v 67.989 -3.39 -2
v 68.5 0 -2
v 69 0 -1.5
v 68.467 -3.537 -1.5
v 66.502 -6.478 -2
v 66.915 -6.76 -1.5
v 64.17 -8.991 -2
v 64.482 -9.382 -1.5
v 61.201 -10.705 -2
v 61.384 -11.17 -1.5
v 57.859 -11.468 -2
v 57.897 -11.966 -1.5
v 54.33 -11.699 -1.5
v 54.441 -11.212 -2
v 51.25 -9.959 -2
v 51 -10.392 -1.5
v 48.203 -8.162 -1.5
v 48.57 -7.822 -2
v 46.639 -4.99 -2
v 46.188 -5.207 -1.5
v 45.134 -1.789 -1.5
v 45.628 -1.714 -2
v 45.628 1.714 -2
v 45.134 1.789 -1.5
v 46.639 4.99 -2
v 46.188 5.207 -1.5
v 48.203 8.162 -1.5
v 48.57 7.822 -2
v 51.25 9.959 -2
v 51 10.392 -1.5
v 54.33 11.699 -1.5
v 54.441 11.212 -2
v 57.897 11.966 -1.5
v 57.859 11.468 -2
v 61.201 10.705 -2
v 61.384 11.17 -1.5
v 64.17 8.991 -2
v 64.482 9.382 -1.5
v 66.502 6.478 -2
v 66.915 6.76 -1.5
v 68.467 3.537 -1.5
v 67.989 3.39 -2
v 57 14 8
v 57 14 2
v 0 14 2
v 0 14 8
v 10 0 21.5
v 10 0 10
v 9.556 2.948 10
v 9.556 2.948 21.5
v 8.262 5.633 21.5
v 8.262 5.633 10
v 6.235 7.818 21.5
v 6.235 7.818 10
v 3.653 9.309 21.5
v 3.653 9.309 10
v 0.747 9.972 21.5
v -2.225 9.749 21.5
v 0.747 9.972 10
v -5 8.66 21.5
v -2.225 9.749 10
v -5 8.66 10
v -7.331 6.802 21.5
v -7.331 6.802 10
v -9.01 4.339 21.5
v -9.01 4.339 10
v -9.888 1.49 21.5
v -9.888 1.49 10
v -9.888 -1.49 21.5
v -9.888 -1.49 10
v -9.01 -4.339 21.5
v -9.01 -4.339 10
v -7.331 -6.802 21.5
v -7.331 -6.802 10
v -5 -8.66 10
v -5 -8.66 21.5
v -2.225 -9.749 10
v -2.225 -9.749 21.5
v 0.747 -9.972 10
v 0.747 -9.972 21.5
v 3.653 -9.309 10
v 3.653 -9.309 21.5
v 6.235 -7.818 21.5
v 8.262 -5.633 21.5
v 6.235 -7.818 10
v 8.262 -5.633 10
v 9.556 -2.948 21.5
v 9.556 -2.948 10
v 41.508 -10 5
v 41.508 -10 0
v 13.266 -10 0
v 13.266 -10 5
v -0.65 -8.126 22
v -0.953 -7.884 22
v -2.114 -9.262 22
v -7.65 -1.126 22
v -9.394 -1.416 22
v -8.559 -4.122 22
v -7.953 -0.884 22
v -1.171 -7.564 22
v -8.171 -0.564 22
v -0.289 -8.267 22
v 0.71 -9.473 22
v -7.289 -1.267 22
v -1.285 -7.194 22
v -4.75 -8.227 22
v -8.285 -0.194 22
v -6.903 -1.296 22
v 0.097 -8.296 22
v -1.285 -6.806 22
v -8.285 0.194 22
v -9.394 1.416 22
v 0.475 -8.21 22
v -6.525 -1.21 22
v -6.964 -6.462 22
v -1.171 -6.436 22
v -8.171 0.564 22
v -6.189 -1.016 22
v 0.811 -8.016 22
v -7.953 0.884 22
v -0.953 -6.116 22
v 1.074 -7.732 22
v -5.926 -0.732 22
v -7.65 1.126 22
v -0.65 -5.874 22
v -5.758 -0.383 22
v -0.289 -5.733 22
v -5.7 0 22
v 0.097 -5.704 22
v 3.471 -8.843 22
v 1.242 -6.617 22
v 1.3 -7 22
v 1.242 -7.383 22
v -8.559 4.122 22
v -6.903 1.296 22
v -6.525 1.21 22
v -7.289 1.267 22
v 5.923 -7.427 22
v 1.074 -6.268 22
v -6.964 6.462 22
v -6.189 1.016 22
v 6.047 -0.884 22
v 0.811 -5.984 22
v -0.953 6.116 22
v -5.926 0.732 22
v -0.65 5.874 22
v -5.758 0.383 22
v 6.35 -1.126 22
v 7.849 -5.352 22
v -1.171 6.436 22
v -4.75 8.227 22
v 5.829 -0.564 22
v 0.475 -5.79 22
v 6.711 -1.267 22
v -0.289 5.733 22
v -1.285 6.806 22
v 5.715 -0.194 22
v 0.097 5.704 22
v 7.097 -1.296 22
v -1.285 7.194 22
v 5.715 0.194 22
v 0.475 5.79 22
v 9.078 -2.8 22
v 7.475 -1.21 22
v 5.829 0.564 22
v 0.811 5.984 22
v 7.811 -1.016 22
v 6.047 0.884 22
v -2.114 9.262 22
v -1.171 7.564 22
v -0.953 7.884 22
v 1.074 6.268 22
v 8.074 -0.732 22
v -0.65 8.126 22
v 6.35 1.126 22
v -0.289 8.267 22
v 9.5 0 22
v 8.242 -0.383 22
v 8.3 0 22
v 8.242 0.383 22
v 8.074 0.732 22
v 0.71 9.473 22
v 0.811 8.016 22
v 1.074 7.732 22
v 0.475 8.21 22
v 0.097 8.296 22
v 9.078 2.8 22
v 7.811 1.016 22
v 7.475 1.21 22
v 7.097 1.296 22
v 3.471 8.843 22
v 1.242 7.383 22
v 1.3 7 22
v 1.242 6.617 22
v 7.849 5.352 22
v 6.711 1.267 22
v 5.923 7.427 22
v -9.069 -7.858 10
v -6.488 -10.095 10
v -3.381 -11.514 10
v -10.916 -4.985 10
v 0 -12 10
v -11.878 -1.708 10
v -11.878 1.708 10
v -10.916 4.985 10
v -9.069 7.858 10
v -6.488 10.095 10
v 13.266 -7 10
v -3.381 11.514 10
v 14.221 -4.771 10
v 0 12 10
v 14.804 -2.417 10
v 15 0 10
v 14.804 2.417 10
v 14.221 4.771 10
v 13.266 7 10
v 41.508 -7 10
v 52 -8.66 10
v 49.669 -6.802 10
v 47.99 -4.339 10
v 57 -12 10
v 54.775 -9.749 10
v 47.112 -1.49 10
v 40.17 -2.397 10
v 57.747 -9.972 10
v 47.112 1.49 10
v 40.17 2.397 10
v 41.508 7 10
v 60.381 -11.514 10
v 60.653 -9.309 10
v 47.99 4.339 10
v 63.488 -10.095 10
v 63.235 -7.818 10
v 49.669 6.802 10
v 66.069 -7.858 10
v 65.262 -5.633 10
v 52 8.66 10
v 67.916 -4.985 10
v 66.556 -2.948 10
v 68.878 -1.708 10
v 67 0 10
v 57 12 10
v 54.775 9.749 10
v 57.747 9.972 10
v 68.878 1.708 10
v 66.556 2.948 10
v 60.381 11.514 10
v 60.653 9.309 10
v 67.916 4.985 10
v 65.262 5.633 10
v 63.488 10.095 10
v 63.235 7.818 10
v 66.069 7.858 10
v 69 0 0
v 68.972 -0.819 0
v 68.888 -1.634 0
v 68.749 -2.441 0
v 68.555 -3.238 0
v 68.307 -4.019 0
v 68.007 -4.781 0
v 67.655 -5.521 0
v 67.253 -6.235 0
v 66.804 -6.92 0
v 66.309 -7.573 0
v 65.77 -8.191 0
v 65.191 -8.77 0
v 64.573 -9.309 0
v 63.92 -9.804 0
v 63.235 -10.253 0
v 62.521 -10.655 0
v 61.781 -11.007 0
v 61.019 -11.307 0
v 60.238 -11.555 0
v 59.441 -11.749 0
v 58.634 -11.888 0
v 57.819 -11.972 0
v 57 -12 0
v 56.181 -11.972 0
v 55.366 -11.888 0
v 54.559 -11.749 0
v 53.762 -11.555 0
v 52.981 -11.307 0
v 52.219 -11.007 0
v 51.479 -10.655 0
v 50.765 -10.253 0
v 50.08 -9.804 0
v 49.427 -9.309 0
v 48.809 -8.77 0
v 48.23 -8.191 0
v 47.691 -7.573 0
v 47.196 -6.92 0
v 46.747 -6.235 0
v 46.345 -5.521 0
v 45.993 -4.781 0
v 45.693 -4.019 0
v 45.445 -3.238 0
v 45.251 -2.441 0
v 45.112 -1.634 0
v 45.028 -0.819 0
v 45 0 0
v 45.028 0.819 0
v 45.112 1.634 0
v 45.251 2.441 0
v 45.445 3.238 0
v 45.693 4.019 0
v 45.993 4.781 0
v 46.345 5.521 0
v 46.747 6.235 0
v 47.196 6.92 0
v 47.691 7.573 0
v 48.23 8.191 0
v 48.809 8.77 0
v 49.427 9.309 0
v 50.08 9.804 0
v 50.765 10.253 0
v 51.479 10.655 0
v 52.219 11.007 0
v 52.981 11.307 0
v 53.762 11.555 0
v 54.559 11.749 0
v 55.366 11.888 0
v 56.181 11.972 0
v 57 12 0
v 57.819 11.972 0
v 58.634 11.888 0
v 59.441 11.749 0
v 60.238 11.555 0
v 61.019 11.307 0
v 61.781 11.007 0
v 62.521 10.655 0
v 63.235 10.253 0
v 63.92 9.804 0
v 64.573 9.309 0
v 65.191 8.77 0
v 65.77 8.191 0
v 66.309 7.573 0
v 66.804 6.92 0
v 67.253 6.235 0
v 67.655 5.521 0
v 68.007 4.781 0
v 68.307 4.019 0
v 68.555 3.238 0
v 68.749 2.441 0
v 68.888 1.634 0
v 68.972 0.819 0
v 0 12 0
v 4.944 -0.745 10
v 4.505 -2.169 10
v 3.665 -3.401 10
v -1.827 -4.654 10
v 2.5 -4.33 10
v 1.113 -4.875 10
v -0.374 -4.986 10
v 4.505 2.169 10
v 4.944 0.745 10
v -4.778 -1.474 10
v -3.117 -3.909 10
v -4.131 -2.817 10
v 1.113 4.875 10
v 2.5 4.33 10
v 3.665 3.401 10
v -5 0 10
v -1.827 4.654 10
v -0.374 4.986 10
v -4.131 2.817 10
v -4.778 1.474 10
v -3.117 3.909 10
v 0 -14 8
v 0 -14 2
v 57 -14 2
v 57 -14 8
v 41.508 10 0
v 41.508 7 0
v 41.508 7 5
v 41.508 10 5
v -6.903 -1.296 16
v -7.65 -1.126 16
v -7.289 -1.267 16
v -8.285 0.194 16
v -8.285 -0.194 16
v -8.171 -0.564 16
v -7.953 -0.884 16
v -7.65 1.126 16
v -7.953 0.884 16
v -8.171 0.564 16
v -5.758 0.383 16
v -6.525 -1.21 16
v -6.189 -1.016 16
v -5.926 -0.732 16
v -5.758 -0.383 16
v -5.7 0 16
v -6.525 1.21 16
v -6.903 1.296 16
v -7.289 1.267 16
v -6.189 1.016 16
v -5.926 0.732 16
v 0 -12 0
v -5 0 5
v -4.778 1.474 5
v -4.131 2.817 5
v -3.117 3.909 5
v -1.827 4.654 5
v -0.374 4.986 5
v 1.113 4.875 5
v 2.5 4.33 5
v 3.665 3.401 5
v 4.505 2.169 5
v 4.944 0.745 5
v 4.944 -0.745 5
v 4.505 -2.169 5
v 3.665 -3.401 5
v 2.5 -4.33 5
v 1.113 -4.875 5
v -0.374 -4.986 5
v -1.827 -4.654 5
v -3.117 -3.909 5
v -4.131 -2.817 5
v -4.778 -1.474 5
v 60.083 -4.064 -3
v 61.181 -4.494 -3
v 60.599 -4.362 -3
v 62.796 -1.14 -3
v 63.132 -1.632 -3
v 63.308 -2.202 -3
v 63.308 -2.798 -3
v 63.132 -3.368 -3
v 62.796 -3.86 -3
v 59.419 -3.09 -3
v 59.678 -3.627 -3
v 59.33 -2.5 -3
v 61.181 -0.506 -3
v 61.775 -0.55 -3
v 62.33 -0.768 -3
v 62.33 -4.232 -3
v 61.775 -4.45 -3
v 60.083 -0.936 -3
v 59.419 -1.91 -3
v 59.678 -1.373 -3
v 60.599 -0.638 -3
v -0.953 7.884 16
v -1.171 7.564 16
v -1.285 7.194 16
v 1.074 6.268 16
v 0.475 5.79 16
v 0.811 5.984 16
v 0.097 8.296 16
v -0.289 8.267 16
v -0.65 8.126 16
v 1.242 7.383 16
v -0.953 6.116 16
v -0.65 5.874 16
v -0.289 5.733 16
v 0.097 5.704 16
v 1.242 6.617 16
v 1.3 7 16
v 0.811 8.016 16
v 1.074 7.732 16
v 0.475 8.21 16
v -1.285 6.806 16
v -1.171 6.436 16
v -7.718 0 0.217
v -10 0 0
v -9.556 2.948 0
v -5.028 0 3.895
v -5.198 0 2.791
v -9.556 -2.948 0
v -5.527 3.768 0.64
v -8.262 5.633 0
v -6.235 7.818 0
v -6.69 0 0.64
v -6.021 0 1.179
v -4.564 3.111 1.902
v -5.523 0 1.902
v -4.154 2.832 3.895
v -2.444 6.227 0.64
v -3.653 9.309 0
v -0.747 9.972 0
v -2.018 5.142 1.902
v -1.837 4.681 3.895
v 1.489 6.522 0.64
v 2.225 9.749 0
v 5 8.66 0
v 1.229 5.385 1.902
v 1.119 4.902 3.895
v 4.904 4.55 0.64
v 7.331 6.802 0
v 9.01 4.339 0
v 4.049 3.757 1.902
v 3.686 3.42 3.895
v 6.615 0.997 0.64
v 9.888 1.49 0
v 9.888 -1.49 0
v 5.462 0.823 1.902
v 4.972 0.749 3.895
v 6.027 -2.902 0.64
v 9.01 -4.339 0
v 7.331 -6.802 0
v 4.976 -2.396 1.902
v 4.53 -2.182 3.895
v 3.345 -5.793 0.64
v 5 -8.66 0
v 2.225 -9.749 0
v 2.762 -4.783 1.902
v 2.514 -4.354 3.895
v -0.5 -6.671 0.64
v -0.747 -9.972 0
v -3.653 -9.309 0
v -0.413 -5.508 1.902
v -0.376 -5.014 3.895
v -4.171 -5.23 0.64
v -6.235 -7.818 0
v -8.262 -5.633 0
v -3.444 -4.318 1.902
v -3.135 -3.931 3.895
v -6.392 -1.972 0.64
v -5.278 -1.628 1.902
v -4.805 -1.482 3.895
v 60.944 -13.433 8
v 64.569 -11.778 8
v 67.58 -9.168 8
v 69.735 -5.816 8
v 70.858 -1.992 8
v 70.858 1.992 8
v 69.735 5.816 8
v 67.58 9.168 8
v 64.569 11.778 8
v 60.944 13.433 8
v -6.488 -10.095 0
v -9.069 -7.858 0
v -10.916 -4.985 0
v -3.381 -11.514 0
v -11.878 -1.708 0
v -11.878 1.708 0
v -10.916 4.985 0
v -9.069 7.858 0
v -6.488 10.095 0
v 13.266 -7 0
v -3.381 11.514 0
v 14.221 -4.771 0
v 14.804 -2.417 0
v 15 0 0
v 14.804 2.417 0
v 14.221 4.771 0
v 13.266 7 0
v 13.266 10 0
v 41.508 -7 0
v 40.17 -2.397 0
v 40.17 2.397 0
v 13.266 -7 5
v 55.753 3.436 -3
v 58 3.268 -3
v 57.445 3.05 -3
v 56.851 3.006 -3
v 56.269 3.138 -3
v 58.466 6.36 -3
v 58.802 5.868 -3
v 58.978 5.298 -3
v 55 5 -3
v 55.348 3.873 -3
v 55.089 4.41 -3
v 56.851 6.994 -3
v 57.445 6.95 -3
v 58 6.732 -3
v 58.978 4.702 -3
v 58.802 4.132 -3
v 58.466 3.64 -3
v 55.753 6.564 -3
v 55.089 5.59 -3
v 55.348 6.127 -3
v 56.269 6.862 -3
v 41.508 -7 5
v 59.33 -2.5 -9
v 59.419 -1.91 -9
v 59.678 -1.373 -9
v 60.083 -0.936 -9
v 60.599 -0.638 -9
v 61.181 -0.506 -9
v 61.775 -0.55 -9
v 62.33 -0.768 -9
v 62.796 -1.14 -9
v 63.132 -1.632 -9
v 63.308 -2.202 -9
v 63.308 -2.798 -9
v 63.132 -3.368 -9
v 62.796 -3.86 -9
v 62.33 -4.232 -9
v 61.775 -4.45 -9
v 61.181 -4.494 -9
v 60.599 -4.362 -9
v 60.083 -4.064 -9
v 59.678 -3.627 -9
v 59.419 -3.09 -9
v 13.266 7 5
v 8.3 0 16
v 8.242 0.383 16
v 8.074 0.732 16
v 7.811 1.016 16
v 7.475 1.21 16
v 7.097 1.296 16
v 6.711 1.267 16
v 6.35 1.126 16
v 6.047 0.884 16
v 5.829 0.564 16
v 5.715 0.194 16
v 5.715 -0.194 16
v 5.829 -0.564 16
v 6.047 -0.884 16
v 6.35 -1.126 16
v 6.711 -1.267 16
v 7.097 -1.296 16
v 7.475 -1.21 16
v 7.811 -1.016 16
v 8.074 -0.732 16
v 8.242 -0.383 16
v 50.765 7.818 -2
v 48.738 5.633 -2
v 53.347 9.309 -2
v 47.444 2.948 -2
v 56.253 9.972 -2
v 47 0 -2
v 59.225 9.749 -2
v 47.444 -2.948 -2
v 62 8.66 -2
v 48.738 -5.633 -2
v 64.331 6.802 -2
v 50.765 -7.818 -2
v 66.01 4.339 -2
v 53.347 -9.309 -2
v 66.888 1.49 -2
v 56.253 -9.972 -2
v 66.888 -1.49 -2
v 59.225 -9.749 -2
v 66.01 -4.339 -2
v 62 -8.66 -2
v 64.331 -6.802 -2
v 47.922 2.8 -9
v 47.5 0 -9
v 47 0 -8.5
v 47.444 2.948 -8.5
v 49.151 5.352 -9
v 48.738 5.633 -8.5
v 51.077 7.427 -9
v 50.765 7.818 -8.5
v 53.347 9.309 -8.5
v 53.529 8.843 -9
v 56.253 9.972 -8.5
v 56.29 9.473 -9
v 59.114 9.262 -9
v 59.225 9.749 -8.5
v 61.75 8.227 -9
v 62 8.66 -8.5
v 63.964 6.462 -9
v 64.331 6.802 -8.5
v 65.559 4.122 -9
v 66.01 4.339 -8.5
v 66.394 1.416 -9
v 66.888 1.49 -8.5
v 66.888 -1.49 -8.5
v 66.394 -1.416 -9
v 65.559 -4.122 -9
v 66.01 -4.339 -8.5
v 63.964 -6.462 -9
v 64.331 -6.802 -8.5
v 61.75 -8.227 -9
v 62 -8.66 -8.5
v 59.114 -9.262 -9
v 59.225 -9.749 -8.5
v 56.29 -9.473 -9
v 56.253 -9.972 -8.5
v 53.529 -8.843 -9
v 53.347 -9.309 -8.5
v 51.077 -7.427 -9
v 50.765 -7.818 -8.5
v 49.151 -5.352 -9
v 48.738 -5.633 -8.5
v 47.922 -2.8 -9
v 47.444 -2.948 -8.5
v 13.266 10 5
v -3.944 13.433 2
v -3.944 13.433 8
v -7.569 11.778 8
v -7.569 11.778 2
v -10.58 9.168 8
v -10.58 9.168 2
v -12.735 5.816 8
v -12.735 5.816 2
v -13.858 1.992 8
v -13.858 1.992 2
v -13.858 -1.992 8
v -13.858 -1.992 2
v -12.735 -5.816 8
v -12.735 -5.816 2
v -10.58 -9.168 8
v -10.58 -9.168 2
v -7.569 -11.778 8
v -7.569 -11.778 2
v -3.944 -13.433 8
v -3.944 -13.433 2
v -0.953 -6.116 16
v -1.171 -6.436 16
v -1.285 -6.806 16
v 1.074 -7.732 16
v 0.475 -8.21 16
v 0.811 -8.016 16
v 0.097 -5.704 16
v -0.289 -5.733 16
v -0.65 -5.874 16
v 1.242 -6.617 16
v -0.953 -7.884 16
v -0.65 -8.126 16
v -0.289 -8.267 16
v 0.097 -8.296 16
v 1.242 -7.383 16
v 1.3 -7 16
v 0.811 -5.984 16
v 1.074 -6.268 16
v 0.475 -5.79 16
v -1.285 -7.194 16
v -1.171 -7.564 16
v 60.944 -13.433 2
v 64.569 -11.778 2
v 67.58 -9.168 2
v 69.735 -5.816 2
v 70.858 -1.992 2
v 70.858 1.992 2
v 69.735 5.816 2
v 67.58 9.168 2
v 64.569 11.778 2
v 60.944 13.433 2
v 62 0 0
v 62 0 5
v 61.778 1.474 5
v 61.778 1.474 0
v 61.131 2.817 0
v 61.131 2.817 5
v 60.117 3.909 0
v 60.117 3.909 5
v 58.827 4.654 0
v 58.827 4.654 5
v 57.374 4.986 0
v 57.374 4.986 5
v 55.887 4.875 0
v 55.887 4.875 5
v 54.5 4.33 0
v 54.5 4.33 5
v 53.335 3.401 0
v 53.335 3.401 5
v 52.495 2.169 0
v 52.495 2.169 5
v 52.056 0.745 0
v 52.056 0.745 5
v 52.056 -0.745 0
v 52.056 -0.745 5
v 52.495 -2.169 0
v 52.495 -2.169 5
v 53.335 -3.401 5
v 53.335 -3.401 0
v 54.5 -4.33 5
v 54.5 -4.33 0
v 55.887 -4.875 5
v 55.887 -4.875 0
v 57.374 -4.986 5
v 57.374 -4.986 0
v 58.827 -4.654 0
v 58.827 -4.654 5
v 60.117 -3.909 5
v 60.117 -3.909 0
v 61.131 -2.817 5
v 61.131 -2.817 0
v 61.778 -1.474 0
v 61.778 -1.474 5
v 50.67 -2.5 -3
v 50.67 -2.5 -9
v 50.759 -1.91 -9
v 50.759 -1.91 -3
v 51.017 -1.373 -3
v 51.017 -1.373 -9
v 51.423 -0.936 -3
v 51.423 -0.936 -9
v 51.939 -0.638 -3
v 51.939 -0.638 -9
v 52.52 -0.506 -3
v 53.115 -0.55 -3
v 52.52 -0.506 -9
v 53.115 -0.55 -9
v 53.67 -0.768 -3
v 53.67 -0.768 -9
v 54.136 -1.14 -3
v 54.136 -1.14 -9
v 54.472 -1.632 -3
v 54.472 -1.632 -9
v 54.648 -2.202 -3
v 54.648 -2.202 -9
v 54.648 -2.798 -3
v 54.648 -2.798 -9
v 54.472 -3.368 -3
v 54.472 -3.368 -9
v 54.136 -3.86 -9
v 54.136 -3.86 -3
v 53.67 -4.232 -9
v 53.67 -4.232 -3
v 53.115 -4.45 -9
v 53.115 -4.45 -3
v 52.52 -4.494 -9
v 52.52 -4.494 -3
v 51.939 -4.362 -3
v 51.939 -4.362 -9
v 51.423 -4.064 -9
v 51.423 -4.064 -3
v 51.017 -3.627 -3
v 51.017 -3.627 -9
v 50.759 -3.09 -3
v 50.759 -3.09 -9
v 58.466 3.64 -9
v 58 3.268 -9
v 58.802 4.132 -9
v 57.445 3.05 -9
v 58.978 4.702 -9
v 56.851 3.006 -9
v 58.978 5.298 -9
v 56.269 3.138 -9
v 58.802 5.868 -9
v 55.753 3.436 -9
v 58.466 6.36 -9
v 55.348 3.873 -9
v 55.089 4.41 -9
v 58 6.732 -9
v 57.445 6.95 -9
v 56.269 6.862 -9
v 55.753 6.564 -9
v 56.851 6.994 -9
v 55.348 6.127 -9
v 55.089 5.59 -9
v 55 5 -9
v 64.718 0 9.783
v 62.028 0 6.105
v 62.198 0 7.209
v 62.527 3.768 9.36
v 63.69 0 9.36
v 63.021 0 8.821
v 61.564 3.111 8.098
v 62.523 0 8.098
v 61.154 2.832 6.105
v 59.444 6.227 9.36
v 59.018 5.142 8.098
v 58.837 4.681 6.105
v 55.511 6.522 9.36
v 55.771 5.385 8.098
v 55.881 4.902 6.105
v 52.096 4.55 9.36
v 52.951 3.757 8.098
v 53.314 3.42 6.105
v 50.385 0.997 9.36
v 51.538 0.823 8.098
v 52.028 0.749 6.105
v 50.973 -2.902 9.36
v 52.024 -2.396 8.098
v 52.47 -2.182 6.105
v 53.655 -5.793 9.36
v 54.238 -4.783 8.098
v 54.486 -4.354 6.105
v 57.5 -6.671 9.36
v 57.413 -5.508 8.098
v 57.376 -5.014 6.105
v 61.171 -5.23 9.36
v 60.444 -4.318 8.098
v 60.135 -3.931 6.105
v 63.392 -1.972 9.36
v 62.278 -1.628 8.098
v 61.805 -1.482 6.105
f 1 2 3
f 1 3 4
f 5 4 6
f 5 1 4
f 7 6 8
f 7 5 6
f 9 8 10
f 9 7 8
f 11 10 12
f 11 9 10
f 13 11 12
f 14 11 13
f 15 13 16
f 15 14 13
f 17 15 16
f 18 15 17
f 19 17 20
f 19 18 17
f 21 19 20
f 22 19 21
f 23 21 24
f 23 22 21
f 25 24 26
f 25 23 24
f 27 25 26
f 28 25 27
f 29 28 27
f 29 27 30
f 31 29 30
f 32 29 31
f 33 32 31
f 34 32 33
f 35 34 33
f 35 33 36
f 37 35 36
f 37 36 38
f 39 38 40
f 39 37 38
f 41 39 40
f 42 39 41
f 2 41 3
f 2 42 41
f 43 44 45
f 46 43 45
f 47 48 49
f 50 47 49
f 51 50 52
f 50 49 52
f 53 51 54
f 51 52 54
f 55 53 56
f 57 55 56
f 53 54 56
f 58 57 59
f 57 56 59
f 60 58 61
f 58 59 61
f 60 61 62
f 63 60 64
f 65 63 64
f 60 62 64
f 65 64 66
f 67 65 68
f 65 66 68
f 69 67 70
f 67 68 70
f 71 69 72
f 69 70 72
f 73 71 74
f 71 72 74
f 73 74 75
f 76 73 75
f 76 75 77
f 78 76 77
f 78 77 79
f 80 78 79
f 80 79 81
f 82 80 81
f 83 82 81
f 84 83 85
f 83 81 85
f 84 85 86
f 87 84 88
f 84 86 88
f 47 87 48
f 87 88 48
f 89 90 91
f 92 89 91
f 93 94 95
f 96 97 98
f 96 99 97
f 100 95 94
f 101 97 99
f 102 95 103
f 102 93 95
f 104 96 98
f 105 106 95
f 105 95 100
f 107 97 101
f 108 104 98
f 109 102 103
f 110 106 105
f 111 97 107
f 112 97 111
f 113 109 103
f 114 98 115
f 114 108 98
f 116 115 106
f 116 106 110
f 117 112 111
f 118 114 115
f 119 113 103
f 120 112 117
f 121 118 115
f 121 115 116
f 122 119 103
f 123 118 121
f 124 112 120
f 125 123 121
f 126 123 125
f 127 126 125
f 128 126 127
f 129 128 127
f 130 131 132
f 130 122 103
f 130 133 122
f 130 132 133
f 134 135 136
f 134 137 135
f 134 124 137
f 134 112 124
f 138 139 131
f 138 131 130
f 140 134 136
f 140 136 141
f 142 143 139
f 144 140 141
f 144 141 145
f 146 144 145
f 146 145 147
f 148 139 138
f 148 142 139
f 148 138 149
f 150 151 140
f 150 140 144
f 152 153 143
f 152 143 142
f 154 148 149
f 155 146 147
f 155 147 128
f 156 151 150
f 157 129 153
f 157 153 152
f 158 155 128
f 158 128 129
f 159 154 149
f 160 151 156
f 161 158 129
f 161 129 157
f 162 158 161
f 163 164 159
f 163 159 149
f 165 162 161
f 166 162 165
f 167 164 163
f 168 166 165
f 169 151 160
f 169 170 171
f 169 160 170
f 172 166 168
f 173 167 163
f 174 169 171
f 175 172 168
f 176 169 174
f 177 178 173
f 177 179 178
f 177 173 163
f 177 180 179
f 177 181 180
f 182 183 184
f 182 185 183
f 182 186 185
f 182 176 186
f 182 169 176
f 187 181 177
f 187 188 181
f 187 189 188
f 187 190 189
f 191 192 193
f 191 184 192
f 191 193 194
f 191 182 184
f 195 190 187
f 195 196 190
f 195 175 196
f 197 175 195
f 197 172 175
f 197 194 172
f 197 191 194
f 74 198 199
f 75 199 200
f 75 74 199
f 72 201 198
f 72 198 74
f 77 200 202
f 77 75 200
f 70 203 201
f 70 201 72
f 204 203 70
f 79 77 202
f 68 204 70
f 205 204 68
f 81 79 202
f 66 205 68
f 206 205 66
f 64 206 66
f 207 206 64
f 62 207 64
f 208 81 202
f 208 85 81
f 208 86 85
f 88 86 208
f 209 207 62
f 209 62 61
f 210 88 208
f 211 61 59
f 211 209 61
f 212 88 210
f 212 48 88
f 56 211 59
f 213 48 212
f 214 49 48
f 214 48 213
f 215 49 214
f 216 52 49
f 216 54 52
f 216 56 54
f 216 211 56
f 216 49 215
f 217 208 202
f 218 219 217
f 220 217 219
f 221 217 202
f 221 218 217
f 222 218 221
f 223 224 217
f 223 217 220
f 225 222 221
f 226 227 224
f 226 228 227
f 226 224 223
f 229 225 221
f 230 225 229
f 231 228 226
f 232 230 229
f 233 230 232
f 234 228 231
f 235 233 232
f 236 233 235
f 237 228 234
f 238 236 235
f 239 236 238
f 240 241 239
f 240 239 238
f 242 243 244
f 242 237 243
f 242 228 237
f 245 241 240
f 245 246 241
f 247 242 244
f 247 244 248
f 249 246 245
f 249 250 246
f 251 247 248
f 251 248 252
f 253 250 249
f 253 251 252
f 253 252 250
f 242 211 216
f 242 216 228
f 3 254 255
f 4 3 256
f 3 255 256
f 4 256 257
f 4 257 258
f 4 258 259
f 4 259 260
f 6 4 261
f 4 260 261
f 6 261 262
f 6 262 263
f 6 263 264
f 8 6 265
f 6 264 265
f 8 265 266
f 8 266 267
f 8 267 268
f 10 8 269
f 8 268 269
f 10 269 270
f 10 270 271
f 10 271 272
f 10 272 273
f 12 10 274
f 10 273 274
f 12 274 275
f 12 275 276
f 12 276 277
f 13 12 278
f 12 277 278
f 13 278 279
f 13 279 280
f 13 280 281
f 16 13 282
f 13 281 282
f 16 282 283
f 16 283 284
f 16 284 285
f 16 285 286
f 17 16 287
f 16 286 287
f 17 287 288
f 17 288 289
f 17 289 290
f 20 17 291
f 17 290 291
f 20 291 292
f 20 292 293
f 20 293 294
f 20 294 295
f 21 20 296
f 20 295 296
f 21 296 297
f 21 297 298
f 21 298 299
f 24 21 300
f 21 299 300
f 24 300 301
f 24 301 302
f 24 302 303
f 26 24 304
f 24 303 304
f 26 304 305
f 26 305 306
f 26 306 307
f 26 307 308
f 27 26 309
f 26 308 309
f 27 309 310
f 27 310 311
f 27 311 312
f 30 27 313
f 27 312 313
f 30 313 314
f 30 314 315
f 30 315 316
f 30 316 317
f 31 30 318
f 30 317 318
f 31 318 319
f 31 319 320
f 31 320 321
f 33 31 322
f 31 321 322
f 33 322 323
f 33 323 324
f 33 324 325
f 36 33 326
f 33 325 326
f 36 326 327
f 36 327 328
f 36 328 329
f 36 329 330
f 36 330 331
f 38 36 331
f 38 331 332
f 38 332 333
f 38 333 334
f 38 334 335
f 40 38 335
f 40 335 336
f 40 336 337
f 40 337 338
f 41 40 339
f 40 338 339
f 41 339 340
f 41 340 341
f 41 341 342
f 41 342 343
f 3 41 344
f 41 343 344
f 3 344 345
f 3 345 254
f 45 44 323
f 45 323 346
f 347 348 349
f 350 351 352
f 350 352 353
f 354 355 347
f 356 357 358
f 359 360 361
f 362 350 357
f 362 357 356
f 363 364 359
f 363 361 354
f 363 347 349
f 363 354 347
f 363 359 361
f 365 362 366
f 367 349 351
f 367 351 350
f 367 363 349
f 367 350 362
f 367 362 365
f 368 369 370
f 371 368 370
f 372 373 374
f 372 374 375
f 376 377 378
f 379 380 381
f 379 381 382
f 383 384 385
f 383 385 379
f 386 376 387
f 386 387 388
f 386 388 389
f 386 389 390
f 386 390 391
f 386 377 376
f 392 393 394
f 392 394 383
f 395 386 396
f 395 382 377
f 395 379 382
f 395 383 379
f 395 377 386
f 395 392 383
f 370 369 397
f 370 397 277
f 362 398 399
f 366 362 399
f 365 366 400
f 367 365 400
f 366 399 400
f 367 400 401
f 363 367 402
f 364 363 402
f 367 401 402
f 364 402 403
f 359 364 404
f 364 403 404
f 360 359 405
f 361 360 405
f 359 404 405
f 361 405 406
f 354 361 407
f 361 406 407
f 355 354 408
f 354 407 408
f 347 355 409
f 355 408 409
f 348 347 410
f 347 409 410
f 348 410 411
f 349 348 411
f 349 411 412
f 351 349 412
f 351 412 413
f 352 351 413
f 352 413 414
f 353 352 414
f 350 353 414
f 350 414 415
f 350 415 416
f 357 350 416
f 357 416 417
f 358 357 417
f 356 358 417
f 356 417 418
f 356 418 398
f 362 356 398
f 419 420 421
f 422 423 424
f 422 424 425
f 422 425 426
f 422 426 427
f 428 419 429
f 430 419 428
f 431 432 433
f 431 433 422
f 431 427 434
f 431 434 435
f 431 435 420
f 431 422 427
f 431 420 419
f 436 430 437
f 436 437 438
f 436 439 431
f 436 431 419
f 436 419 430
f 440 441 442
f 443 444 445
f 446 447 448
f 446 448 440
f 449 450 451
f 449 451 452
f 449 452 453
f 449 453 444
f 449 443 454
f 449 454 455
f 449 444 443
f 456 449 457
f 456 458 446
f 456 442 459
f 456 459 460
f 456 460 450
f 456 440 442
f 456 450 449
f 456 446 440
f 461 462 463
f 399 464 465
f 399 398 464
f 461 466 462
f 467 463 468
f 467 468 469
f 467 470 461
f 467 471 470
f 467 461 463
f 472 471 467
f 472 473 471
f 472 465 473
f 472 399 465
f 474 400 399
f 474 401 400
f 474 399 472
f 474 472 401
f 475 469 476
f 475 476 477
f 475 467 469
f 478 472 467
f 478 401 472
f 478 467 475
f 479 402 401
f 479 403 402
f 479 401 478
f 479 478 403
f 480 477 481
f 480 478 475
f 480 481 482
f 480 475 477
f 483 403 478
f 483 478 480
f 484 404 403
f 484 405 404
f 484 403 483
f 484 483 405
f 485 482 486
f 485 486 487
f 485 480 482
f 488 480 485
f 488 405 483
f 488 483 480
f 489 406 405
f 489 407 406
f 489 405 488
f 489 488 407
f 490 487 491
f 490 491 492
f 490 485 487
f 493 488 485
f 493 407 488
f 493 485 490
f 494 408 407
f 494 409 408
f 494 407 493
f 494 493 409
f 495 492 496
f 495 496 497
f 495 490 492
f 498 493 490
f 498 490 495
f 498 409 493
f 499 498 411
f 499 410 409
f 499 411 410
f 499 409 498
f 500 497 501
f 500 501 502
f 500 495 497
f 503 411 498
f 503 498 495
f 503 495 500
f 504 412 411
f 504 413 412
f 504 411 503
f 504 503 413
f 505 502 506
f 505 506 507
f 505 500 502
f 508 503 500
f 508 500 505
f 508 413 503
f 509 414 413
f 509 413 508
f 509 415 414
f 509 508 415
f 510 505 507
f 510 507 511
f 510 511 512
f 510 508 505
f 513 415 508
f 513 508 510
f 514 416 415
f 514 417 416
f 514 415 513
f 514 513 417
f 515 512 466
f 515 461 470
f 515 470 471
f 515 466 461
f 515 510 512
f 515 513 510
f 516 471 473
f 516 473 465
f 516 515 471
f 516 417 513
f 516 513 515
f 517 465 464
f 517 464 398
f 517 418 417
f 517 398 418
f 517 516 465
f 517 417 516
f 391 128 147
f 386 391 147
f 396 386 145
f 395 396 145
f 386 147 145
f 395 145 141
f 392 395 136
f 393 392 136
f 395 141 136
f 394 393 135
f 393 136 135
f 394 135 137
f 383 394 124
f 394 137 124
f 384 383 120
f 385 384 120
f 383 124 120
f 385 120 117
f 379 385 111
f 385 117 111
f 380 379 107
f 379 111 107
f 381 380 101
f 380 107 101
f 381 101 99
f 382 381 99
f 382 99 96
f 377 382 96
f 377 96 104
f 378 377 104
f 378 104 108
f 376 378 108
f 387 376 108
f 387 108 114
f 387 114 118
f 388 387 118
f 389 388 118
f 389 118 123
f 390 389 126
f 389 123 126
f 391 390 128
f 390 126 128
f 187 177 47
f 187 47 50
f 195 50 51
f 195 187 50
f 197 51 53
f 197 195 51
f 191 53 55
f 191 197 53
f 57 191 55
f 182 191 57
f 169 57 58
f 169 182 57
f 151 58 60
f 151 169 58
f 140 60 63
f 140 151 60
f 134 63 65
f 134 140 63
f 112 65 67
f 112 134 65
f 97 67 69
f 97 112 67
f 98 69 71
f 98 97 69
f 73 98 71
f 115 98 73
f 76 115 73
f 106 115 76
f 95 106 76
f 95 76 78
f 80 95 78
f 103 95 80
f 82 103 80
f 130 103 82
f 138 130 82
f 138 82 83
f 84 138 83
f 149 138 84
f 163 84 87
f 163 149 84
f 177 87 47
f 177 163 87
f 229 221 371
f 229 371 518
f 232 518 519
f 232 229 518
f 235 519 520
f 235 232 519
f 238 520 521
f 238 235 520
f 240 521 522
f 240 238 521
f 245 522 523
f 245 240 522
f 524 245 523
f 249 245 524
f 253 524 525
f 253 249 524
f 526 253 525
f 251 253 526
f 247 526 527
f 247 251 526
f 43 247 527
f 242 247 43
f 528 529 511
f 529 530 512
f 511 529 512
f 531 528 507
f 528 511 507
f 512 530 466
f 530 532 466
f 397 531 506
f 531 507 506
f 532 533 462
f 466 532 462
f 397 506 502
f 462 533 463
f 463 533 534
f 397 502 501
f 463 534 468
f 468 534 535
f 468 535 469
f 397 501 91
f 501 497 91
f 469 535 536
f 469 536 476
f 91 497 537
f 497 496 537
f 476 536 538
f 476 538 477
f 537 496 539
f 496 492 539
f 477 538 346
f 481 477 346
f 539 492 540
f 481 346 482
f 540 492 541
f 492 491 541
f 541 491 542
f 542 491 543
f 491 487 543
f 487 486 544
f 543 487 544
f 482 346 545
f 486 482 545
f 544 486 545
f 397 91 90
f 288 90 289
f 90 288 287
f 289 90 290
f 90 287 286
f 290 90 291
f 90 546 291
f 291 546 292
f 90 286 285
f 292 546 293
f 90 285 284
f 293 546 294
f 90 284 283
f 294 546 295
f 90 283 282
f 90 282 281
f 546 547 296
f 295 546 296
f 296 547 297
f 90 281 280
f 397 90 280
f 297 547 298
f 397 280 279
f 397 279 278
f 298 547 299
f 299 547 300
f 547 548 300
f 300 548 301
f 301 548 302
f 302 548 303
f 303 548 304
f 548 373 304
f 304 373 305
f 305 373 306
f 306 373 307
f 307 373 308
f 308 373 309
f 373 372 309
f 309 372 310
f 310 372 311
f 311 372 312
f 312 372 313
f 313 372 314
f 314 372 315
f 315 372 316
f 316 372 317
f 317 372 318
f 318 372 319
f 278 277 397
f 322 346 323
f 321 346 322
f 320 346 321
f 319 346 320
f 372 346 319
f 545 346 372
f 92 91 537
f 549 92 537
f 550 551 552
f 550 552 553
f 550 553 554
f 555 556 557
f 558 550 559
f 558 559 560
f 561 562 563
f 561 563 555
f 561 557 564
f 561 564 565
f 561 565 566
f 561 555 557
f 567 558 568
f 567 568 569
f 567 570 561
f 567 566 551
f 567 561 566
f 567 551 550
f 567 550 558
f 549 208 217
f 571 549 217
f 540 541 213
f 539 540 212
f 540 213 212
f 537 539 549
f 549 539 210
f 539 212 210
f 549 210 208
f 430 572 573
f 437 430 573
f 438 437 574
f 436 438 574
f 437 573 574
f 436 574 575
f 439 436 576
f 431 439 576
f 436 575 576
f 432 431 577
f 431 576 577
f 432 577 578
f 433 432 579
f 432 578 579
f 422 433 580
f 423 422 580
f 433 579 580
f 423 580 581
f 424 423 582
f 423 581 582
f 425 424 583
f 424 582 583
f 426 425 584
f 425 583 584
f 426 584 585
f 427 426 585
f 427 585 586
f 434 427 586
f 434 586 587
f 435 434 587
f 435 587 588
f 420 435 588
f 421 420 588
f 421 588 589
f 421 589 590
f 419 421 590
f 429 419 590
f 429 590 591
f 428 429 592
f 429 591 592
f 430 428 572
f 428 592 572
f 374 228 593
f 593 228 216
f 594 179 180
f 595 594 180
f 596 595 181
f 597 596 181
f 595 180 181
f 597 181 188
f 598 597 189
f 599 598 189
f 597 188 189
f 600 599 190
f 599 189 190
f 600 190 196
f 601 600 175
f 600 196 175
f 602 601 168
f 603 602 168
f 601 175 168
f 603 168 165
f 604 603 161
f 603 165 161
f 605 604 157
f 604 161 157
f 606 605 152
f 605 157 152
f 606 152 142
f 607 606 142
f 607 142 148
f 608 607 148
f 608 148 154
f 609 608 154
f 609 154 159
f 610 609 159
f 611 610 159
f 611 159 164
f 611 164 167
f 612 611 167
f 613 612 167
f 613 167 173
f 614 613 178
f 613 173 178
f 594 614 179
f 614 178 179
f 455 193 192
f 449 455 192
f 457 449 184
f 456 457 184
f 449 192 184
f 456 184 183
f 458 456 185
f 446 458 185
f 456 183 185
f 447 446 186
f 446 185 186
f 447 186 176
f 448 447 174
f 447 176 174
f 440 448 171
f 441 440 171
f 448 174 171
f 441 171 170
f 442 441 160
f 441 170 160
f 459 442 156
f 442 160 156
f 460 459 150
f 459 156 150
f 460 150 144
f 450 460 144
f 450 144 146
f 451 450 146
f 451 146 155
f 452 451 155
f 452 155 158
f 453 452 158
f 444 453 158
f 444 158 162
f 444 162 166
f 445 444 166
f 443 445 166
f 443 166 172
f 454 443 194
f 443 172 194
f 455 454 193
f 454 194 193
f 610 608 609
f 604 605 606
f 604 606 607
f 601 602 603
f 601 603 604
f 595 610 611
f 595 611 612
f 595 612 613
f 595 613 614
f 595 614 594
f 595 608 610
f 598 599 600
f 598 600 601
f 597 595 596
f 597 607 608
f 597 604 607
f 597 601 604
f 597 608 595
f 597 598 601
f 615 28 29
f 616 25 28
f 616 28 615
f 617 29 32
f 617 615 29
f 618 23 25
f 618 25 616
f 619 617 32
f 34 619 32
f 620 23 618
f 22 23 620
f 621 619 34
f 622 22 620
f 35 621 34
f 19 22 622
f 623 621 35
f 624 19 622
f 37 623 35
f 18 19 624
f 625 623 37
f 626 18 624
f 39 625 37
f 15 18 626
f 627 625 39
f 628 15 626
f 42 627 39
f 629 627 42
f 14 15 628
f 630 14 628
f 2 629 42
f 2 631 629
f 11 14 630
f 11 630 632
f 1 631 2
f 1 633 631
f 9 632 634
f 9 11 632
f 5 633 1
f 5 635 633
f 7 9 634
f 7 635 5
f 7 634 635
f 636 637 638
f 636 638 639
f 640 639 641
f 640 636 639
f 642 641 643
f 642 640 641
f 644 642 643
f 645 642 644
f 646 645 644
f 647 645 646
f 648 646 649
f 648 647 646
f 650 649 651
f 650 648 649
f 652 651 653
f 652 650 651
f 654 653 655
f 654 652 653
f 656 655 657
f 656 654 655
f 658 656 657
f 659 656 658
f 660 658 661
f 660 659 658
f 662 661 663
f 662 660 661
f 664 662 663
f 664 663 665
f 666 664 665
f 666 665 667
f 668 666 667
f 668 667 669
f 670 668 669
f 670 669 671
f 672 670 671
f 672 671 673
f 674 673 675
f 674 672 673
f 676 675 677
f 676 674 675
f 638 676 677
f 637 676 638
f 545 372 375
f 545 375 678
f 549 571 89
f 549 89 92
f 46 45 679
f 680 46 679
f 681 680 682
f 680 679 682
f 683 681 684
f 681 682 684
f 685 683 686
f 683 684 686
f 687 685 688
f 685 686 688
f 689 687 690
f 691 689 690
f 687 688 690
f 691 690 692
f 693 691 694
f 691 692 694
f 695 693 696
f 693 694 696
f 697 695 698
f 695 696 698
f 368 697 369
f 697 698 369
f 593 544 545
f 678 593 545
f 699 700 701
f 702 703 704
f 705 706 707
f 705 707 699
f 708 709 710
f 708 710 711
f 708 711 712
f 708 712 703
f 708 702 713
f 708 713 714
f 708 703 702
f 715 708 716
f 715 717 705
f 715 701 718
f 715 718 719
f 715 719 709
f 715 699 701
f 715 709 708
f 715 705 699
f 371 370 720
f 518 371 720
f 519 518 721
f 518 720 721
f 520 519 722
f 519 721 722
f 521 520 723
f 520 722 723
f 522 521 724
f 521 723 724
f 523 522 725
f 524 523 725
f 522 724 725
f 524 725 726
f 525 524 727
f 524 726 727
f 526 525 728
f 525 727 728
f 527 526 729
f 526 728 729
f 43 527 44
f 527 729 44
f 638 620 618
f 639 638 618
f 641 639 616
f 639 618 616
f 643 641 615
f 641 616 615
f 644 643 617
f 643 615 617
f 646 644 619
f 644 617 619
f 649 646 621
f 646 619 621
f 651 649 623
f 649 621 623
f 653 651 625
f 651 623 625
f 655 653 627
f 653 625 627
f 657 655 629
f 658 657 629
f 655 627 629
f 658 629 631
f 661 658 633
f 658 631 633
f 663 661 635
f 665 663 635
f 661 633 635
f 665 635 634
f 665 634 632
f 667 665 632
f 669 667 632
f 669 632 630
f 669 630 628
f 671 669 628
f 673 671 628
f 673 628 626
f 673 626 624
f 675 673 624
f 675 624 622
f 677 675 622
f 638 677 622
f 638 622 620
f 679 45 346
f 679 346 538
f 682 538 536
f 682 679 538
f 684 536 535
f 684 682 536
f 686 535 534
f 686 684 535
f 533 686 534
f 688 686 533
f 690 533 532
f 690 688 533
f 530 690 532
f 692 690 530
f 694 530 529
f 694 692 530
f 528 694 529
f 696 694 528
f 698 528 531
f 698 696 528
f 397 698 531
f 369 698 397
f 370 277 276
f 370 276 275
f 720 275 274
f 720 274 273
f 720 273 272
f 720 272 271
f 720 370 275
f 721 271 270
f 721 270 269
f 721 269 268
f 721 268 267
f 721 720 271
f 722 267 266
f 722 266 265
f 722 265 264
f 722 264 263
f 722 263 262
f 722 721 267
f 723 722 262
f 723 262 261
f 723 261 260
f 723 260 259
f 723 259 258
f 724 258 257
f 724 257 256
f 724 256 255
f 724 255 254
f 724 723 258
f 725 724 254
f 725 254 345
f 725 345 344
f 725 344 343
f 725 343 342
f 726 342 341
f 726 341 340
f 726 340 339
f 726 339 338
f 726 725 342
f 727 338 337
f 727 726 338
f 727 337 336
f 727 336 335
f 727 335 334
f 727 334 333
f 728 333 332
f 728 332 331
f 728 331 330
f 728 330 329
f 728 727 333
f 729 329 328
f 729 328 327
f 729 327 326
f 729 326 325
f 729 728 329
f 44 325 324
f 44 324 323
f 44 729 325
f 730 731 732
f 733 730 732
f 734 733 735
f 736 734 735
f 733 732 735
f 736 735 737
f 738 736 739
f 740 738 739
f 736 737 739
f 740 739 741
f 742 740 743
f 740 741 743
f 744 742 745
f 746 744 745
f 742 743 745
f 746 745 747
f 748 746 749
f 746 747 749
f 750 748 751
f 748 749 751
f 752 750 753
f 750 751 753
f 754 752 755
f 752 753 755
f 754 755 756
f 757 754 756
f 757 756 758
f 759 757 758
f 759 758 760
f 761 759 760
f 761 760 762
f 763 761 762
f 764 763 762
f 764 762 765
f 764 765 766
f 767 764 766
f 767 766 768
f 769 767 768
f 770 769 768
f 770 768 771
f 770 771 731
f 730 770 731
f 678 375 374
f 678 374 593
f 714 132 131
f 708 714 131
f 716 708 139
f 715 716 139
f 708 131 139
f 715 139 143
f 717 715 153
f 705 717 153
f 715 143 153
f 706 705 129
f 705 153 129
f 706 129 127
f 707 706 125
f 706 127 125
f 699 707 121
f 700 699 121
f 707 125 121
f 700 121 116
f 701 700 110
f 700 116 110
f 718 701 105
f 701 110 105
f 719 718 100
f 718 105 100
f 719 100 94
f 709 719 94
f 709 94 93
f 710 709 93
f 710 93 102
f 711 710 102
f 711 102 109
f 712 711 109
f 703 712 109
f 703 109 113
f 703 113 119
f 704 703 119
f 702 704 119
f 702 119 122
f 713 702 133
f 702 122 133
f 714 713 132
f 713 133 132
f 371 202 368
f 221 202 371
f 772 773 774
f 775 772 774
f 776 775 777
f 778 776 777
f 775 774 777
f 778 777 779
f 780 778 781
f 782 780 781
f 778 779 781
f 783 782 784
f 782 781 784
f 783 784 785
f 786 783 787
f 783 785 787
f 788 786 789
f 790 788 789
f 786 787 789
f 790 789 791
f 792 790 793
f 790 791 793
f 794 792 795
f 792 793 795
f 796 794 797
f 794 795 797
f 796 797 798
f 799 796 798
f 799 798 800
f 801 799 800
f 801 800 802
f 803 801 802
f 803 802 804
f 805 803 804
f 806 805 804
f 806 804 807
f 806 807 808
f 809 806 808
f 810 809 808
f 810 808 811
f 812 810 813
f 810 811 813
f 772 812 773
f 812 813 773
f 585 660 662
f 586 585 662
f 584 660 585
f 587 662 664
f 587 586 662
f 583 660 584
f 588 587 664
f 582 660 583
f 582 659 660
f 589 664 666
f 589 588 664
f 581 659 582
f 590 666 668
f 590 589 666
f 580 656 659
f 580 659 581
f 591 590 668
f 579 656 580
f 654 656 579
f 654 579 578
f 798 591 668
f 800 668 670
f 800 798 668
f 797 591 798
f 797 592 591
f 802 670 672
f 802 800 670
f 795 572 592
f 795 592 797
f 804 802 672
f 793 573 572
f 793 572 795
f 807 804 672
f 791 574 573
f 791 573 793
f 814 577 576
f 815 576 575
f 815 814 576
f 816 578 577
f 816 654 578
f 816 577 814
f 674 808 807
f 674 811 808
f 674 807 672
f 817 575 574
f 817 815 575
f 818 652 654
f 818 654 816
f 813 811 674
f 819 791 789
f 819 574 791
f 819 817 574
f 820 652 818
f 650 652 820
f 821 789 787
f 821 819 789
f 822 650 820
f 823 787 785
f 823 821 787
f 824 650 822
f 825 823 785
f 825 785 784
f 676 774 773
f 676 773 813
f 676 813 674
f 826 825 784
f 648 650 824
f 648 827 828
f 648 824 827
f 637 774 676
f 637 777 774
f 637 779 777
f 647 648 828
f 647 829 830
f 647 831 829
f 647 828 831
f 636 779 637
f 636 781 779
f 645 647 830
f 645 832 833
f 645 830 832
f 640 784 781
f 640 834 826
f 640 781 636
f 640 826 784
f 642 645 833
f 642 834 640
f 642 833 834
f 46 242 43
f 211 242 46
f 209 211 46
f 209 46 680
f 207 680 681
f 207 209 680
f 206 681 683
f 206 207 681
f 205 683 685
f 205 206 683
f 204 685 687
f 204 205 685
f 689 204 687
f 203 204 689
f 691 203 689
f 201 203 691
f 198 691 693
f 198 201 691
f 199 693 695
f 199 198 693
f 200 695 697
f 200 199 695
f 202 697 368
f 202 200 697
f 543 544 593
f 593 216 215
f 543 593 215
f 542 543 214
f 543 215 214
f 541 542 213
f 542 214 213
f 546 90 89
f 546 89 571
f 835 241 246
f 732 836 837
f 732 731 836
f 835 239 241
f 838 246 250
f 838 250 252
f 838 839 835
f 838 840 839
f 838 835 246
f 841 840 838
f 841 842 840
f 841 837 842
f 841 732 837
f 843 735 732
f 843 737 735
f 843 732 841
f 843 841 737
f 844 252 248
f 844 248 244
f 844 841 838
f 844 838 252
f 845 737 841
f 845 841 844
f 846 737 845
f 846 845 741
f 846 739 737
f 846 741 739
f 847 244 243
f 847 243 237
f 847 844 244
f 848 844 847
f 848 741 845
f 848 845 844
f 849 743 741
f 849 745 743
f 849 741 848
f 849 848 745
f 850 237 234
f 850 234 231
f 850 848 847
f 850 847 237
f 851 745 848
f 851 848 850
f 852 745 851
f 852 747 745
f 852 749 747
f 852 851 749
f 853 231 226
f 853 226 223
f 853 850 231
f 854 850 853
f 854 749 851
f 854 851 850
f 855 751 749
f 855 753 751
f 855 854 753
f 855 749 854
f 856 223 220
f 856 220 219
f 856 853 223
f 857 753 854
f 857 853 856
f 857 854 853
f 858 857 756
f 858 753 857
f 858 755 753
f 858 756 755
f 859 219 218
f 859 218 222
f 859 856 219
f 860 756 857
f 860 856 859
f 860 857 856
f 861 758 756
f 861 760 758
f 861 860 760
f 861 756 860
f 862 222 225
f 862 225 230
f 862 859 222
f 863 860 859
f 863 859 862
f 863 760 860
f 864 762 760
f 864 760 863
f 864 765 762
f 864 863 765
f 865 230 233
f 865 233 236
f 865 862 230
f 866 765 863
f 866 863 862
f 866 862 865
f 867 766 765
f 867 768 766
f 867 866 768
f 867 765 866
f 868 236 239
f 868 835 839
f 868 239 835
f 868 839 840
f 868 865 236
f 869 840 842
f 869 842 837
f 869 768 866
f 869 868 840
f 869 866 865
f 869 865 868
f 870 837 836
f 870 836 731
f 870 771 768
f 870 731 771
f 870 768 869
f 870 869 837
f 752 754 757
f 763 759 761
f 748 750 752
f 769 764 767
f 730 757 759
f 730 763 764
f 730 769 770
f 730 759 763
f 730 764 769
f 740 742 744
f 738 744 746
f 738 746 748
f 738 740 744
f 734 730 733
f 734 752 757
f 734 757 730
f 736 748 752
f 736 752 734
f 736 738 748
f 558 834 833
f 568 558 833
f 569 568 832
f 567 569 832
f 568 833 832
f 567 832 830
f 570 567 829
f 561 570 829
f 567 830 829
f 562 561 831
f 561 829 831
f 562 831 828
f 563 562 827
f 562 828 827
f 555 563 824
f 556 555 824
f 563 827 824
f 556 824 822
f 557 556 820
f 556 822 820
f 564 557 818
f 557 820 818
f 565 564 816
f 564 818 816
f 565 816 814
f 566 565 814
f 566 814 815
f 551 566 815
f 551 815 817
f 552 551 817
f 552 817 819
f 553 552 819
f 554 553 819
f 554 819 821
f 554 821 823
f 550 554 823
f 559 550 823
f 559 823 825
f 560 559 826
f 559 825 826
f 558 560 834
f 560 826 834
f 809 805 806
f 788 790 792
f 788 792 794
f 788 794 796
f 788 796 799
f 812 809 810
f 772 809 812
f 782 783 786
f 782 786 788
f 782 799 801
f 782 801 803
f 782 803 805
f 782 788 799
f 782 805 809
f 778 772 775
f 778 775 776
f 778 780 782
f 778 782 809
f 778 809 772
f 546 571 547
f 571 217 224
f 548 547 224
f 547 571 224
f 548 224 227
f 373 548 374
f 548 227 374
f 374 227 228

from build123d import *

# Parameters (mm, degrees)
EXTRUDE_1_DEPTH     = 10
SKETCH_2_R          = 10
EXTRUDE_2_DEPTH     = 12
SKETCH_3_R          = 10
EXTRUDE_3_DEPTH     = 9
SKETCH_4_R          = 12
SKETCH_4_R_2        = 10
EXTRUDE_4_DEPTH     = 2
CHAMFER_1_SIZE      = 0.5
CHAMFER_2_SIZE      = 2
SKETCH_5_R          = 2
CUT_EXTRUDE_1_DEPTH = 6
SKETCH_6_R          = 1.3
CUT_EXTRUDE_2_DEPTH = 6
CUT_EXTRUDE_3_REACH = 76.82
SKETCH_8_W          = 28.241567454
SKETCH_8_H          = 3
CUT_EXTRUDE_4_DEPTH = 5
SKETCH_9_R          = 5
CUT_EXTRUDE_5_DEPTH = 10
SKETCH_10_R         = 5
CUT_EXTRUDE_6_DEPTH = 10
FILLET_1_SIZE       = 5


# Some blends are built 0.0001 mm under size
with BuildPart() as part:
    # 草图1 → 凸台-拉伸1 (new body)
    with BuildSketch(Plane.XY):
        with BuildLine():
            Line((57, 14), (0, 14))
            ThreePointArc((0, 14), (-14, 0), (0, -14))
            Line((0, -14), (57, -14))
            ThreePointArc((57, -14), (71, 0), (57, 14))
        make_face()
    extrude(amount=EXTRUDE_1_DEPTH)

    # 草图2 → 凸台-拉伸2 (add)
    with BuildSketch(Plane.XY.offset(10)):
        Circle(SKETCH_2_R)
    extrude(amount=EXTRUDE_2_DEPTH)

    # 草图3 → 凸台-拉伸3 (add)
    with BuildSketch(Plane(origin=(0, 0, 0), x_dir=(-1, 0, 0), z_dir=(0, 0, -1))):
        with Locations((-57, 0)):
            Circle(SKETCH_3_R)
    extrude(amount=EXTRUDE_3_DEPTH)

    # 草图4 → 凸台-拉伸4 (add)
    with BuildSketch(Plane(origin=(0, 0, 0), x_dir=(-1, 0, 0), z_dir=(0, 0, -1))):
        with Locations(Location((-57, 0, 0), (0, 0, 180))):
            Circle(SKETCH_4_R)
        with Locations((-57, 0)):
            Circle(SKETCH_4_R_2, mode=Mode.SUBTRACT)
    extrude(amount=EXTRUDE_4_DEPTH)

    # 倒角1
    chamfer_1_edges = [part.edges().sort_by_distance(p)[0] for p in [
        (-10, 0, 22),
        (67, 0, -9),
        (45, 0, -2),
    ]]
    chamfer(chamfer_1_edges, length=CHAMFER_1_SIZE)

    # 倒角2
    chamfer_2_edges = [part.edges().sort_by_distance(p)[0] for p in [
        (71, 0, 10),
        (28.5, 14, 10),
        (-14, 0, 10),
        (28.5, -14, 10),
        (-14, 0, 0),
        (28.5, 14, 0),
        (71, 0, 0),
        (28.5, -14, 0),
    ]]
    chamfer(chamfer_2_edges, length=CHAMFER_2_SIZE - 0.0001)  # a hair under: the kernel refuses the full size

    # 草图5 → 切除-拉伸1 (cut)
    with BuildSketch(Plane(origin=(0, 0, -9), x_dir=(-1, 0, 0), z_dir=(0, 0, -1))):
        with Locations((-57, 5)):
            Circle(SKETCH_5_R)
        with Locations((-52.669872981, -2.5)):
            Circle(SKETCH_5_R)
        with Locations((-61.330127019, -2.5)):
            Circle(SKETCH_5_R)
    extrude(amount=-CUT_EXTRUDE_1_DEPTH, mode=Mode.SUBTRACT)

    # 草图6 → 切除-拉伸2 (cut)
    with BuildSketch(Plane.XY.offset(22)):
        with Locations((0, 7)):
            Circle(SKETCH_6_R)
        with Locations((7, 0)):
            Circle(SKETCH_6_R)
        with Locations((0, -7)):
            Circle(SKETCH_6_R)
        with Locations((-7, 0)):
            Circle(SKETCH_6_R)
    extrude(amount=-CUT_EXTRUDE_2_DEPTH, mode=Mode.SUBTRACT)

    # 草图7 → 切除-拉伸3 (cut, up to next)
    with BuildSketch(Plane.XY.offset(10), mode=Mode.PRIVATE) as cut_extrude_3_sk1:
        with BuildLine():
            ThreePointArc((41.508066615, -7), (40, 0), (41.508066615, 7))
            Line((41.508066615, 7), (13.266499161, 7))
            ThreePointArc((13.266499161, 7), (14.560176637, 3.605725487), (15, 0))
            ThreePointArc((15, 0), (14.560176637, -3.605725487), (13.266499161, -7))
            Line((13.266499161, -7), (41.508066615, -7))
        make_face()
    cut_extrude_3_tool1 = extrude(cut_extrude_3_sk1.sketch, amount=-CUT_EXTRUDE_3_REACH, mode=Mode.PRIVATE) & part.part
    add(cut_extrude_3_tool1.solids().sort_by_distance((27.463612, 0, 10))[0], mode=Mode.SUBTRACT)

    # 草图8 → 切除-拉伸4 (cut)
    with BuildSketch(Plane(origin=(0, 0, 0), x_dir=(-1, 0, 0), z_dir=(0, 0, -1))):
        with Locations((-27.387282888, 8.5)):
            Rectangle(SKETCH_8_W, SKETCH_8_H)
        with Locations((-27.387282888, -8.5)):
            Rectangle(SKETCH_8_W, SKETCH_8_H)
    extrude(amount=-CUT_EXTRUDE_4_DEPTH, mode=Mode.SUBTRACT)

    # 草图9 → 切除-拉伸5 (cut)
    with BuildSketch(Plane.XY.offset(10)):
        with Locations((57, 0)):
            Circle(SKETCH_9_R)
    extrude(amount=-CUT_EXTRUDE_5_DEPTH, mode=Mode.SUBTRACT)

    # 草图10 → 切除-拉伸6 (cut)
    with BuildSketch(Plane(origin=(0, 0, 0), x_dir=(-1, 0, 0), z_dir=(0, 0, -1))):
        Circle(SKETCH_10_R)
    extrude(amount=-CUT_EXTRUDE_6_DEPTH, mode=Mode.SUBTRACT)

    # 圆角1
    # a fillet whose section is not a circle: 5 mm, written as the material it takes off along each edge
    with BuildSketch(Plane(origin=(57, 0, 10), x_dir=(1, 0, 0), z_dir=(0, -1, 0))) as fillet_1_piece_1:
        with BuildLine():
            add(Edge.make_bspline([(5 + FILLET_1_SIZE, 0), (5 + FILLET_1_SIZE * 0.831801948466, 0), (5 + FILLET_1_SIZE * 0.663603896932, 0), (5 + FILLET_1_SIZE * 0.292893218813, -FILLET_1_SIZE * 0.0716919198361), (5 + FILLET_1_SIZE * 0.0716919198361, -FILLET_1_SIZE * 0.292893218813), (5, -FILLET_1_SIZE * 0.663603896932), (5, -FILLET_1_SIZE * 0.831801948466), (5, -FILLET_1_SIZE)], knots=[0, 0, 0, 0, 0, 0, 0.5, 0.5, 1, 1, 1, 1, 1, 1], degree=5))
            Line((5, -FILLET_1_SIZE), (5, 0))
            Line((5, 0), (5 + FILLET_1_SIZE, 0))
        make_face()
    revolve(axis=Axis((57, 0, 10), (0, 0, 1)), mode=Mode.SUBTRACT)
    with BuildSketch(Plane(origin=(0, 0, 0), x_dir=(-1, 0, 0), z_dir=(0, -1, 0))) as fillet_1_piece_2:
        with BuildLine():
            add(Edge.make_bspline([(5 + FILLET_1_SIZE, 0), (5 + FILLET_1_SIZE * 0.831801948466, 0), (5 + FILLET_1_SIZE * 0.663603896932, 0), (5 + FILLET_1_SIZE * 0.292893218813, -FILLET_1_SIZE * 0.0716919198361), (5 + FILLET_1_SIZE * 0.0716919198361, -FILLET_1_SIZE * 0.292893218813), (5, -FILLET_1_SIZE * 0.663603896932), (5, -FILLET_1_SIZE * 0.831801948466), (5, -FILLET_1_SIZE)], knots=[0, 0, 0, 0, 0, 0, 0.5, 0.5, 1, 1, 1, 1, 1, 1], degree=5))
            Line((5, -FILLET_1_SIZE), (5, 0))
            Line((5, 0), (5 + FILLET_1_SIZE, 0))
        make_face()
    revolve(axis=Axis((0, 0, 0), (0, 0, -1)), mode=Mode.SUBTRACT)


solid = part.part
